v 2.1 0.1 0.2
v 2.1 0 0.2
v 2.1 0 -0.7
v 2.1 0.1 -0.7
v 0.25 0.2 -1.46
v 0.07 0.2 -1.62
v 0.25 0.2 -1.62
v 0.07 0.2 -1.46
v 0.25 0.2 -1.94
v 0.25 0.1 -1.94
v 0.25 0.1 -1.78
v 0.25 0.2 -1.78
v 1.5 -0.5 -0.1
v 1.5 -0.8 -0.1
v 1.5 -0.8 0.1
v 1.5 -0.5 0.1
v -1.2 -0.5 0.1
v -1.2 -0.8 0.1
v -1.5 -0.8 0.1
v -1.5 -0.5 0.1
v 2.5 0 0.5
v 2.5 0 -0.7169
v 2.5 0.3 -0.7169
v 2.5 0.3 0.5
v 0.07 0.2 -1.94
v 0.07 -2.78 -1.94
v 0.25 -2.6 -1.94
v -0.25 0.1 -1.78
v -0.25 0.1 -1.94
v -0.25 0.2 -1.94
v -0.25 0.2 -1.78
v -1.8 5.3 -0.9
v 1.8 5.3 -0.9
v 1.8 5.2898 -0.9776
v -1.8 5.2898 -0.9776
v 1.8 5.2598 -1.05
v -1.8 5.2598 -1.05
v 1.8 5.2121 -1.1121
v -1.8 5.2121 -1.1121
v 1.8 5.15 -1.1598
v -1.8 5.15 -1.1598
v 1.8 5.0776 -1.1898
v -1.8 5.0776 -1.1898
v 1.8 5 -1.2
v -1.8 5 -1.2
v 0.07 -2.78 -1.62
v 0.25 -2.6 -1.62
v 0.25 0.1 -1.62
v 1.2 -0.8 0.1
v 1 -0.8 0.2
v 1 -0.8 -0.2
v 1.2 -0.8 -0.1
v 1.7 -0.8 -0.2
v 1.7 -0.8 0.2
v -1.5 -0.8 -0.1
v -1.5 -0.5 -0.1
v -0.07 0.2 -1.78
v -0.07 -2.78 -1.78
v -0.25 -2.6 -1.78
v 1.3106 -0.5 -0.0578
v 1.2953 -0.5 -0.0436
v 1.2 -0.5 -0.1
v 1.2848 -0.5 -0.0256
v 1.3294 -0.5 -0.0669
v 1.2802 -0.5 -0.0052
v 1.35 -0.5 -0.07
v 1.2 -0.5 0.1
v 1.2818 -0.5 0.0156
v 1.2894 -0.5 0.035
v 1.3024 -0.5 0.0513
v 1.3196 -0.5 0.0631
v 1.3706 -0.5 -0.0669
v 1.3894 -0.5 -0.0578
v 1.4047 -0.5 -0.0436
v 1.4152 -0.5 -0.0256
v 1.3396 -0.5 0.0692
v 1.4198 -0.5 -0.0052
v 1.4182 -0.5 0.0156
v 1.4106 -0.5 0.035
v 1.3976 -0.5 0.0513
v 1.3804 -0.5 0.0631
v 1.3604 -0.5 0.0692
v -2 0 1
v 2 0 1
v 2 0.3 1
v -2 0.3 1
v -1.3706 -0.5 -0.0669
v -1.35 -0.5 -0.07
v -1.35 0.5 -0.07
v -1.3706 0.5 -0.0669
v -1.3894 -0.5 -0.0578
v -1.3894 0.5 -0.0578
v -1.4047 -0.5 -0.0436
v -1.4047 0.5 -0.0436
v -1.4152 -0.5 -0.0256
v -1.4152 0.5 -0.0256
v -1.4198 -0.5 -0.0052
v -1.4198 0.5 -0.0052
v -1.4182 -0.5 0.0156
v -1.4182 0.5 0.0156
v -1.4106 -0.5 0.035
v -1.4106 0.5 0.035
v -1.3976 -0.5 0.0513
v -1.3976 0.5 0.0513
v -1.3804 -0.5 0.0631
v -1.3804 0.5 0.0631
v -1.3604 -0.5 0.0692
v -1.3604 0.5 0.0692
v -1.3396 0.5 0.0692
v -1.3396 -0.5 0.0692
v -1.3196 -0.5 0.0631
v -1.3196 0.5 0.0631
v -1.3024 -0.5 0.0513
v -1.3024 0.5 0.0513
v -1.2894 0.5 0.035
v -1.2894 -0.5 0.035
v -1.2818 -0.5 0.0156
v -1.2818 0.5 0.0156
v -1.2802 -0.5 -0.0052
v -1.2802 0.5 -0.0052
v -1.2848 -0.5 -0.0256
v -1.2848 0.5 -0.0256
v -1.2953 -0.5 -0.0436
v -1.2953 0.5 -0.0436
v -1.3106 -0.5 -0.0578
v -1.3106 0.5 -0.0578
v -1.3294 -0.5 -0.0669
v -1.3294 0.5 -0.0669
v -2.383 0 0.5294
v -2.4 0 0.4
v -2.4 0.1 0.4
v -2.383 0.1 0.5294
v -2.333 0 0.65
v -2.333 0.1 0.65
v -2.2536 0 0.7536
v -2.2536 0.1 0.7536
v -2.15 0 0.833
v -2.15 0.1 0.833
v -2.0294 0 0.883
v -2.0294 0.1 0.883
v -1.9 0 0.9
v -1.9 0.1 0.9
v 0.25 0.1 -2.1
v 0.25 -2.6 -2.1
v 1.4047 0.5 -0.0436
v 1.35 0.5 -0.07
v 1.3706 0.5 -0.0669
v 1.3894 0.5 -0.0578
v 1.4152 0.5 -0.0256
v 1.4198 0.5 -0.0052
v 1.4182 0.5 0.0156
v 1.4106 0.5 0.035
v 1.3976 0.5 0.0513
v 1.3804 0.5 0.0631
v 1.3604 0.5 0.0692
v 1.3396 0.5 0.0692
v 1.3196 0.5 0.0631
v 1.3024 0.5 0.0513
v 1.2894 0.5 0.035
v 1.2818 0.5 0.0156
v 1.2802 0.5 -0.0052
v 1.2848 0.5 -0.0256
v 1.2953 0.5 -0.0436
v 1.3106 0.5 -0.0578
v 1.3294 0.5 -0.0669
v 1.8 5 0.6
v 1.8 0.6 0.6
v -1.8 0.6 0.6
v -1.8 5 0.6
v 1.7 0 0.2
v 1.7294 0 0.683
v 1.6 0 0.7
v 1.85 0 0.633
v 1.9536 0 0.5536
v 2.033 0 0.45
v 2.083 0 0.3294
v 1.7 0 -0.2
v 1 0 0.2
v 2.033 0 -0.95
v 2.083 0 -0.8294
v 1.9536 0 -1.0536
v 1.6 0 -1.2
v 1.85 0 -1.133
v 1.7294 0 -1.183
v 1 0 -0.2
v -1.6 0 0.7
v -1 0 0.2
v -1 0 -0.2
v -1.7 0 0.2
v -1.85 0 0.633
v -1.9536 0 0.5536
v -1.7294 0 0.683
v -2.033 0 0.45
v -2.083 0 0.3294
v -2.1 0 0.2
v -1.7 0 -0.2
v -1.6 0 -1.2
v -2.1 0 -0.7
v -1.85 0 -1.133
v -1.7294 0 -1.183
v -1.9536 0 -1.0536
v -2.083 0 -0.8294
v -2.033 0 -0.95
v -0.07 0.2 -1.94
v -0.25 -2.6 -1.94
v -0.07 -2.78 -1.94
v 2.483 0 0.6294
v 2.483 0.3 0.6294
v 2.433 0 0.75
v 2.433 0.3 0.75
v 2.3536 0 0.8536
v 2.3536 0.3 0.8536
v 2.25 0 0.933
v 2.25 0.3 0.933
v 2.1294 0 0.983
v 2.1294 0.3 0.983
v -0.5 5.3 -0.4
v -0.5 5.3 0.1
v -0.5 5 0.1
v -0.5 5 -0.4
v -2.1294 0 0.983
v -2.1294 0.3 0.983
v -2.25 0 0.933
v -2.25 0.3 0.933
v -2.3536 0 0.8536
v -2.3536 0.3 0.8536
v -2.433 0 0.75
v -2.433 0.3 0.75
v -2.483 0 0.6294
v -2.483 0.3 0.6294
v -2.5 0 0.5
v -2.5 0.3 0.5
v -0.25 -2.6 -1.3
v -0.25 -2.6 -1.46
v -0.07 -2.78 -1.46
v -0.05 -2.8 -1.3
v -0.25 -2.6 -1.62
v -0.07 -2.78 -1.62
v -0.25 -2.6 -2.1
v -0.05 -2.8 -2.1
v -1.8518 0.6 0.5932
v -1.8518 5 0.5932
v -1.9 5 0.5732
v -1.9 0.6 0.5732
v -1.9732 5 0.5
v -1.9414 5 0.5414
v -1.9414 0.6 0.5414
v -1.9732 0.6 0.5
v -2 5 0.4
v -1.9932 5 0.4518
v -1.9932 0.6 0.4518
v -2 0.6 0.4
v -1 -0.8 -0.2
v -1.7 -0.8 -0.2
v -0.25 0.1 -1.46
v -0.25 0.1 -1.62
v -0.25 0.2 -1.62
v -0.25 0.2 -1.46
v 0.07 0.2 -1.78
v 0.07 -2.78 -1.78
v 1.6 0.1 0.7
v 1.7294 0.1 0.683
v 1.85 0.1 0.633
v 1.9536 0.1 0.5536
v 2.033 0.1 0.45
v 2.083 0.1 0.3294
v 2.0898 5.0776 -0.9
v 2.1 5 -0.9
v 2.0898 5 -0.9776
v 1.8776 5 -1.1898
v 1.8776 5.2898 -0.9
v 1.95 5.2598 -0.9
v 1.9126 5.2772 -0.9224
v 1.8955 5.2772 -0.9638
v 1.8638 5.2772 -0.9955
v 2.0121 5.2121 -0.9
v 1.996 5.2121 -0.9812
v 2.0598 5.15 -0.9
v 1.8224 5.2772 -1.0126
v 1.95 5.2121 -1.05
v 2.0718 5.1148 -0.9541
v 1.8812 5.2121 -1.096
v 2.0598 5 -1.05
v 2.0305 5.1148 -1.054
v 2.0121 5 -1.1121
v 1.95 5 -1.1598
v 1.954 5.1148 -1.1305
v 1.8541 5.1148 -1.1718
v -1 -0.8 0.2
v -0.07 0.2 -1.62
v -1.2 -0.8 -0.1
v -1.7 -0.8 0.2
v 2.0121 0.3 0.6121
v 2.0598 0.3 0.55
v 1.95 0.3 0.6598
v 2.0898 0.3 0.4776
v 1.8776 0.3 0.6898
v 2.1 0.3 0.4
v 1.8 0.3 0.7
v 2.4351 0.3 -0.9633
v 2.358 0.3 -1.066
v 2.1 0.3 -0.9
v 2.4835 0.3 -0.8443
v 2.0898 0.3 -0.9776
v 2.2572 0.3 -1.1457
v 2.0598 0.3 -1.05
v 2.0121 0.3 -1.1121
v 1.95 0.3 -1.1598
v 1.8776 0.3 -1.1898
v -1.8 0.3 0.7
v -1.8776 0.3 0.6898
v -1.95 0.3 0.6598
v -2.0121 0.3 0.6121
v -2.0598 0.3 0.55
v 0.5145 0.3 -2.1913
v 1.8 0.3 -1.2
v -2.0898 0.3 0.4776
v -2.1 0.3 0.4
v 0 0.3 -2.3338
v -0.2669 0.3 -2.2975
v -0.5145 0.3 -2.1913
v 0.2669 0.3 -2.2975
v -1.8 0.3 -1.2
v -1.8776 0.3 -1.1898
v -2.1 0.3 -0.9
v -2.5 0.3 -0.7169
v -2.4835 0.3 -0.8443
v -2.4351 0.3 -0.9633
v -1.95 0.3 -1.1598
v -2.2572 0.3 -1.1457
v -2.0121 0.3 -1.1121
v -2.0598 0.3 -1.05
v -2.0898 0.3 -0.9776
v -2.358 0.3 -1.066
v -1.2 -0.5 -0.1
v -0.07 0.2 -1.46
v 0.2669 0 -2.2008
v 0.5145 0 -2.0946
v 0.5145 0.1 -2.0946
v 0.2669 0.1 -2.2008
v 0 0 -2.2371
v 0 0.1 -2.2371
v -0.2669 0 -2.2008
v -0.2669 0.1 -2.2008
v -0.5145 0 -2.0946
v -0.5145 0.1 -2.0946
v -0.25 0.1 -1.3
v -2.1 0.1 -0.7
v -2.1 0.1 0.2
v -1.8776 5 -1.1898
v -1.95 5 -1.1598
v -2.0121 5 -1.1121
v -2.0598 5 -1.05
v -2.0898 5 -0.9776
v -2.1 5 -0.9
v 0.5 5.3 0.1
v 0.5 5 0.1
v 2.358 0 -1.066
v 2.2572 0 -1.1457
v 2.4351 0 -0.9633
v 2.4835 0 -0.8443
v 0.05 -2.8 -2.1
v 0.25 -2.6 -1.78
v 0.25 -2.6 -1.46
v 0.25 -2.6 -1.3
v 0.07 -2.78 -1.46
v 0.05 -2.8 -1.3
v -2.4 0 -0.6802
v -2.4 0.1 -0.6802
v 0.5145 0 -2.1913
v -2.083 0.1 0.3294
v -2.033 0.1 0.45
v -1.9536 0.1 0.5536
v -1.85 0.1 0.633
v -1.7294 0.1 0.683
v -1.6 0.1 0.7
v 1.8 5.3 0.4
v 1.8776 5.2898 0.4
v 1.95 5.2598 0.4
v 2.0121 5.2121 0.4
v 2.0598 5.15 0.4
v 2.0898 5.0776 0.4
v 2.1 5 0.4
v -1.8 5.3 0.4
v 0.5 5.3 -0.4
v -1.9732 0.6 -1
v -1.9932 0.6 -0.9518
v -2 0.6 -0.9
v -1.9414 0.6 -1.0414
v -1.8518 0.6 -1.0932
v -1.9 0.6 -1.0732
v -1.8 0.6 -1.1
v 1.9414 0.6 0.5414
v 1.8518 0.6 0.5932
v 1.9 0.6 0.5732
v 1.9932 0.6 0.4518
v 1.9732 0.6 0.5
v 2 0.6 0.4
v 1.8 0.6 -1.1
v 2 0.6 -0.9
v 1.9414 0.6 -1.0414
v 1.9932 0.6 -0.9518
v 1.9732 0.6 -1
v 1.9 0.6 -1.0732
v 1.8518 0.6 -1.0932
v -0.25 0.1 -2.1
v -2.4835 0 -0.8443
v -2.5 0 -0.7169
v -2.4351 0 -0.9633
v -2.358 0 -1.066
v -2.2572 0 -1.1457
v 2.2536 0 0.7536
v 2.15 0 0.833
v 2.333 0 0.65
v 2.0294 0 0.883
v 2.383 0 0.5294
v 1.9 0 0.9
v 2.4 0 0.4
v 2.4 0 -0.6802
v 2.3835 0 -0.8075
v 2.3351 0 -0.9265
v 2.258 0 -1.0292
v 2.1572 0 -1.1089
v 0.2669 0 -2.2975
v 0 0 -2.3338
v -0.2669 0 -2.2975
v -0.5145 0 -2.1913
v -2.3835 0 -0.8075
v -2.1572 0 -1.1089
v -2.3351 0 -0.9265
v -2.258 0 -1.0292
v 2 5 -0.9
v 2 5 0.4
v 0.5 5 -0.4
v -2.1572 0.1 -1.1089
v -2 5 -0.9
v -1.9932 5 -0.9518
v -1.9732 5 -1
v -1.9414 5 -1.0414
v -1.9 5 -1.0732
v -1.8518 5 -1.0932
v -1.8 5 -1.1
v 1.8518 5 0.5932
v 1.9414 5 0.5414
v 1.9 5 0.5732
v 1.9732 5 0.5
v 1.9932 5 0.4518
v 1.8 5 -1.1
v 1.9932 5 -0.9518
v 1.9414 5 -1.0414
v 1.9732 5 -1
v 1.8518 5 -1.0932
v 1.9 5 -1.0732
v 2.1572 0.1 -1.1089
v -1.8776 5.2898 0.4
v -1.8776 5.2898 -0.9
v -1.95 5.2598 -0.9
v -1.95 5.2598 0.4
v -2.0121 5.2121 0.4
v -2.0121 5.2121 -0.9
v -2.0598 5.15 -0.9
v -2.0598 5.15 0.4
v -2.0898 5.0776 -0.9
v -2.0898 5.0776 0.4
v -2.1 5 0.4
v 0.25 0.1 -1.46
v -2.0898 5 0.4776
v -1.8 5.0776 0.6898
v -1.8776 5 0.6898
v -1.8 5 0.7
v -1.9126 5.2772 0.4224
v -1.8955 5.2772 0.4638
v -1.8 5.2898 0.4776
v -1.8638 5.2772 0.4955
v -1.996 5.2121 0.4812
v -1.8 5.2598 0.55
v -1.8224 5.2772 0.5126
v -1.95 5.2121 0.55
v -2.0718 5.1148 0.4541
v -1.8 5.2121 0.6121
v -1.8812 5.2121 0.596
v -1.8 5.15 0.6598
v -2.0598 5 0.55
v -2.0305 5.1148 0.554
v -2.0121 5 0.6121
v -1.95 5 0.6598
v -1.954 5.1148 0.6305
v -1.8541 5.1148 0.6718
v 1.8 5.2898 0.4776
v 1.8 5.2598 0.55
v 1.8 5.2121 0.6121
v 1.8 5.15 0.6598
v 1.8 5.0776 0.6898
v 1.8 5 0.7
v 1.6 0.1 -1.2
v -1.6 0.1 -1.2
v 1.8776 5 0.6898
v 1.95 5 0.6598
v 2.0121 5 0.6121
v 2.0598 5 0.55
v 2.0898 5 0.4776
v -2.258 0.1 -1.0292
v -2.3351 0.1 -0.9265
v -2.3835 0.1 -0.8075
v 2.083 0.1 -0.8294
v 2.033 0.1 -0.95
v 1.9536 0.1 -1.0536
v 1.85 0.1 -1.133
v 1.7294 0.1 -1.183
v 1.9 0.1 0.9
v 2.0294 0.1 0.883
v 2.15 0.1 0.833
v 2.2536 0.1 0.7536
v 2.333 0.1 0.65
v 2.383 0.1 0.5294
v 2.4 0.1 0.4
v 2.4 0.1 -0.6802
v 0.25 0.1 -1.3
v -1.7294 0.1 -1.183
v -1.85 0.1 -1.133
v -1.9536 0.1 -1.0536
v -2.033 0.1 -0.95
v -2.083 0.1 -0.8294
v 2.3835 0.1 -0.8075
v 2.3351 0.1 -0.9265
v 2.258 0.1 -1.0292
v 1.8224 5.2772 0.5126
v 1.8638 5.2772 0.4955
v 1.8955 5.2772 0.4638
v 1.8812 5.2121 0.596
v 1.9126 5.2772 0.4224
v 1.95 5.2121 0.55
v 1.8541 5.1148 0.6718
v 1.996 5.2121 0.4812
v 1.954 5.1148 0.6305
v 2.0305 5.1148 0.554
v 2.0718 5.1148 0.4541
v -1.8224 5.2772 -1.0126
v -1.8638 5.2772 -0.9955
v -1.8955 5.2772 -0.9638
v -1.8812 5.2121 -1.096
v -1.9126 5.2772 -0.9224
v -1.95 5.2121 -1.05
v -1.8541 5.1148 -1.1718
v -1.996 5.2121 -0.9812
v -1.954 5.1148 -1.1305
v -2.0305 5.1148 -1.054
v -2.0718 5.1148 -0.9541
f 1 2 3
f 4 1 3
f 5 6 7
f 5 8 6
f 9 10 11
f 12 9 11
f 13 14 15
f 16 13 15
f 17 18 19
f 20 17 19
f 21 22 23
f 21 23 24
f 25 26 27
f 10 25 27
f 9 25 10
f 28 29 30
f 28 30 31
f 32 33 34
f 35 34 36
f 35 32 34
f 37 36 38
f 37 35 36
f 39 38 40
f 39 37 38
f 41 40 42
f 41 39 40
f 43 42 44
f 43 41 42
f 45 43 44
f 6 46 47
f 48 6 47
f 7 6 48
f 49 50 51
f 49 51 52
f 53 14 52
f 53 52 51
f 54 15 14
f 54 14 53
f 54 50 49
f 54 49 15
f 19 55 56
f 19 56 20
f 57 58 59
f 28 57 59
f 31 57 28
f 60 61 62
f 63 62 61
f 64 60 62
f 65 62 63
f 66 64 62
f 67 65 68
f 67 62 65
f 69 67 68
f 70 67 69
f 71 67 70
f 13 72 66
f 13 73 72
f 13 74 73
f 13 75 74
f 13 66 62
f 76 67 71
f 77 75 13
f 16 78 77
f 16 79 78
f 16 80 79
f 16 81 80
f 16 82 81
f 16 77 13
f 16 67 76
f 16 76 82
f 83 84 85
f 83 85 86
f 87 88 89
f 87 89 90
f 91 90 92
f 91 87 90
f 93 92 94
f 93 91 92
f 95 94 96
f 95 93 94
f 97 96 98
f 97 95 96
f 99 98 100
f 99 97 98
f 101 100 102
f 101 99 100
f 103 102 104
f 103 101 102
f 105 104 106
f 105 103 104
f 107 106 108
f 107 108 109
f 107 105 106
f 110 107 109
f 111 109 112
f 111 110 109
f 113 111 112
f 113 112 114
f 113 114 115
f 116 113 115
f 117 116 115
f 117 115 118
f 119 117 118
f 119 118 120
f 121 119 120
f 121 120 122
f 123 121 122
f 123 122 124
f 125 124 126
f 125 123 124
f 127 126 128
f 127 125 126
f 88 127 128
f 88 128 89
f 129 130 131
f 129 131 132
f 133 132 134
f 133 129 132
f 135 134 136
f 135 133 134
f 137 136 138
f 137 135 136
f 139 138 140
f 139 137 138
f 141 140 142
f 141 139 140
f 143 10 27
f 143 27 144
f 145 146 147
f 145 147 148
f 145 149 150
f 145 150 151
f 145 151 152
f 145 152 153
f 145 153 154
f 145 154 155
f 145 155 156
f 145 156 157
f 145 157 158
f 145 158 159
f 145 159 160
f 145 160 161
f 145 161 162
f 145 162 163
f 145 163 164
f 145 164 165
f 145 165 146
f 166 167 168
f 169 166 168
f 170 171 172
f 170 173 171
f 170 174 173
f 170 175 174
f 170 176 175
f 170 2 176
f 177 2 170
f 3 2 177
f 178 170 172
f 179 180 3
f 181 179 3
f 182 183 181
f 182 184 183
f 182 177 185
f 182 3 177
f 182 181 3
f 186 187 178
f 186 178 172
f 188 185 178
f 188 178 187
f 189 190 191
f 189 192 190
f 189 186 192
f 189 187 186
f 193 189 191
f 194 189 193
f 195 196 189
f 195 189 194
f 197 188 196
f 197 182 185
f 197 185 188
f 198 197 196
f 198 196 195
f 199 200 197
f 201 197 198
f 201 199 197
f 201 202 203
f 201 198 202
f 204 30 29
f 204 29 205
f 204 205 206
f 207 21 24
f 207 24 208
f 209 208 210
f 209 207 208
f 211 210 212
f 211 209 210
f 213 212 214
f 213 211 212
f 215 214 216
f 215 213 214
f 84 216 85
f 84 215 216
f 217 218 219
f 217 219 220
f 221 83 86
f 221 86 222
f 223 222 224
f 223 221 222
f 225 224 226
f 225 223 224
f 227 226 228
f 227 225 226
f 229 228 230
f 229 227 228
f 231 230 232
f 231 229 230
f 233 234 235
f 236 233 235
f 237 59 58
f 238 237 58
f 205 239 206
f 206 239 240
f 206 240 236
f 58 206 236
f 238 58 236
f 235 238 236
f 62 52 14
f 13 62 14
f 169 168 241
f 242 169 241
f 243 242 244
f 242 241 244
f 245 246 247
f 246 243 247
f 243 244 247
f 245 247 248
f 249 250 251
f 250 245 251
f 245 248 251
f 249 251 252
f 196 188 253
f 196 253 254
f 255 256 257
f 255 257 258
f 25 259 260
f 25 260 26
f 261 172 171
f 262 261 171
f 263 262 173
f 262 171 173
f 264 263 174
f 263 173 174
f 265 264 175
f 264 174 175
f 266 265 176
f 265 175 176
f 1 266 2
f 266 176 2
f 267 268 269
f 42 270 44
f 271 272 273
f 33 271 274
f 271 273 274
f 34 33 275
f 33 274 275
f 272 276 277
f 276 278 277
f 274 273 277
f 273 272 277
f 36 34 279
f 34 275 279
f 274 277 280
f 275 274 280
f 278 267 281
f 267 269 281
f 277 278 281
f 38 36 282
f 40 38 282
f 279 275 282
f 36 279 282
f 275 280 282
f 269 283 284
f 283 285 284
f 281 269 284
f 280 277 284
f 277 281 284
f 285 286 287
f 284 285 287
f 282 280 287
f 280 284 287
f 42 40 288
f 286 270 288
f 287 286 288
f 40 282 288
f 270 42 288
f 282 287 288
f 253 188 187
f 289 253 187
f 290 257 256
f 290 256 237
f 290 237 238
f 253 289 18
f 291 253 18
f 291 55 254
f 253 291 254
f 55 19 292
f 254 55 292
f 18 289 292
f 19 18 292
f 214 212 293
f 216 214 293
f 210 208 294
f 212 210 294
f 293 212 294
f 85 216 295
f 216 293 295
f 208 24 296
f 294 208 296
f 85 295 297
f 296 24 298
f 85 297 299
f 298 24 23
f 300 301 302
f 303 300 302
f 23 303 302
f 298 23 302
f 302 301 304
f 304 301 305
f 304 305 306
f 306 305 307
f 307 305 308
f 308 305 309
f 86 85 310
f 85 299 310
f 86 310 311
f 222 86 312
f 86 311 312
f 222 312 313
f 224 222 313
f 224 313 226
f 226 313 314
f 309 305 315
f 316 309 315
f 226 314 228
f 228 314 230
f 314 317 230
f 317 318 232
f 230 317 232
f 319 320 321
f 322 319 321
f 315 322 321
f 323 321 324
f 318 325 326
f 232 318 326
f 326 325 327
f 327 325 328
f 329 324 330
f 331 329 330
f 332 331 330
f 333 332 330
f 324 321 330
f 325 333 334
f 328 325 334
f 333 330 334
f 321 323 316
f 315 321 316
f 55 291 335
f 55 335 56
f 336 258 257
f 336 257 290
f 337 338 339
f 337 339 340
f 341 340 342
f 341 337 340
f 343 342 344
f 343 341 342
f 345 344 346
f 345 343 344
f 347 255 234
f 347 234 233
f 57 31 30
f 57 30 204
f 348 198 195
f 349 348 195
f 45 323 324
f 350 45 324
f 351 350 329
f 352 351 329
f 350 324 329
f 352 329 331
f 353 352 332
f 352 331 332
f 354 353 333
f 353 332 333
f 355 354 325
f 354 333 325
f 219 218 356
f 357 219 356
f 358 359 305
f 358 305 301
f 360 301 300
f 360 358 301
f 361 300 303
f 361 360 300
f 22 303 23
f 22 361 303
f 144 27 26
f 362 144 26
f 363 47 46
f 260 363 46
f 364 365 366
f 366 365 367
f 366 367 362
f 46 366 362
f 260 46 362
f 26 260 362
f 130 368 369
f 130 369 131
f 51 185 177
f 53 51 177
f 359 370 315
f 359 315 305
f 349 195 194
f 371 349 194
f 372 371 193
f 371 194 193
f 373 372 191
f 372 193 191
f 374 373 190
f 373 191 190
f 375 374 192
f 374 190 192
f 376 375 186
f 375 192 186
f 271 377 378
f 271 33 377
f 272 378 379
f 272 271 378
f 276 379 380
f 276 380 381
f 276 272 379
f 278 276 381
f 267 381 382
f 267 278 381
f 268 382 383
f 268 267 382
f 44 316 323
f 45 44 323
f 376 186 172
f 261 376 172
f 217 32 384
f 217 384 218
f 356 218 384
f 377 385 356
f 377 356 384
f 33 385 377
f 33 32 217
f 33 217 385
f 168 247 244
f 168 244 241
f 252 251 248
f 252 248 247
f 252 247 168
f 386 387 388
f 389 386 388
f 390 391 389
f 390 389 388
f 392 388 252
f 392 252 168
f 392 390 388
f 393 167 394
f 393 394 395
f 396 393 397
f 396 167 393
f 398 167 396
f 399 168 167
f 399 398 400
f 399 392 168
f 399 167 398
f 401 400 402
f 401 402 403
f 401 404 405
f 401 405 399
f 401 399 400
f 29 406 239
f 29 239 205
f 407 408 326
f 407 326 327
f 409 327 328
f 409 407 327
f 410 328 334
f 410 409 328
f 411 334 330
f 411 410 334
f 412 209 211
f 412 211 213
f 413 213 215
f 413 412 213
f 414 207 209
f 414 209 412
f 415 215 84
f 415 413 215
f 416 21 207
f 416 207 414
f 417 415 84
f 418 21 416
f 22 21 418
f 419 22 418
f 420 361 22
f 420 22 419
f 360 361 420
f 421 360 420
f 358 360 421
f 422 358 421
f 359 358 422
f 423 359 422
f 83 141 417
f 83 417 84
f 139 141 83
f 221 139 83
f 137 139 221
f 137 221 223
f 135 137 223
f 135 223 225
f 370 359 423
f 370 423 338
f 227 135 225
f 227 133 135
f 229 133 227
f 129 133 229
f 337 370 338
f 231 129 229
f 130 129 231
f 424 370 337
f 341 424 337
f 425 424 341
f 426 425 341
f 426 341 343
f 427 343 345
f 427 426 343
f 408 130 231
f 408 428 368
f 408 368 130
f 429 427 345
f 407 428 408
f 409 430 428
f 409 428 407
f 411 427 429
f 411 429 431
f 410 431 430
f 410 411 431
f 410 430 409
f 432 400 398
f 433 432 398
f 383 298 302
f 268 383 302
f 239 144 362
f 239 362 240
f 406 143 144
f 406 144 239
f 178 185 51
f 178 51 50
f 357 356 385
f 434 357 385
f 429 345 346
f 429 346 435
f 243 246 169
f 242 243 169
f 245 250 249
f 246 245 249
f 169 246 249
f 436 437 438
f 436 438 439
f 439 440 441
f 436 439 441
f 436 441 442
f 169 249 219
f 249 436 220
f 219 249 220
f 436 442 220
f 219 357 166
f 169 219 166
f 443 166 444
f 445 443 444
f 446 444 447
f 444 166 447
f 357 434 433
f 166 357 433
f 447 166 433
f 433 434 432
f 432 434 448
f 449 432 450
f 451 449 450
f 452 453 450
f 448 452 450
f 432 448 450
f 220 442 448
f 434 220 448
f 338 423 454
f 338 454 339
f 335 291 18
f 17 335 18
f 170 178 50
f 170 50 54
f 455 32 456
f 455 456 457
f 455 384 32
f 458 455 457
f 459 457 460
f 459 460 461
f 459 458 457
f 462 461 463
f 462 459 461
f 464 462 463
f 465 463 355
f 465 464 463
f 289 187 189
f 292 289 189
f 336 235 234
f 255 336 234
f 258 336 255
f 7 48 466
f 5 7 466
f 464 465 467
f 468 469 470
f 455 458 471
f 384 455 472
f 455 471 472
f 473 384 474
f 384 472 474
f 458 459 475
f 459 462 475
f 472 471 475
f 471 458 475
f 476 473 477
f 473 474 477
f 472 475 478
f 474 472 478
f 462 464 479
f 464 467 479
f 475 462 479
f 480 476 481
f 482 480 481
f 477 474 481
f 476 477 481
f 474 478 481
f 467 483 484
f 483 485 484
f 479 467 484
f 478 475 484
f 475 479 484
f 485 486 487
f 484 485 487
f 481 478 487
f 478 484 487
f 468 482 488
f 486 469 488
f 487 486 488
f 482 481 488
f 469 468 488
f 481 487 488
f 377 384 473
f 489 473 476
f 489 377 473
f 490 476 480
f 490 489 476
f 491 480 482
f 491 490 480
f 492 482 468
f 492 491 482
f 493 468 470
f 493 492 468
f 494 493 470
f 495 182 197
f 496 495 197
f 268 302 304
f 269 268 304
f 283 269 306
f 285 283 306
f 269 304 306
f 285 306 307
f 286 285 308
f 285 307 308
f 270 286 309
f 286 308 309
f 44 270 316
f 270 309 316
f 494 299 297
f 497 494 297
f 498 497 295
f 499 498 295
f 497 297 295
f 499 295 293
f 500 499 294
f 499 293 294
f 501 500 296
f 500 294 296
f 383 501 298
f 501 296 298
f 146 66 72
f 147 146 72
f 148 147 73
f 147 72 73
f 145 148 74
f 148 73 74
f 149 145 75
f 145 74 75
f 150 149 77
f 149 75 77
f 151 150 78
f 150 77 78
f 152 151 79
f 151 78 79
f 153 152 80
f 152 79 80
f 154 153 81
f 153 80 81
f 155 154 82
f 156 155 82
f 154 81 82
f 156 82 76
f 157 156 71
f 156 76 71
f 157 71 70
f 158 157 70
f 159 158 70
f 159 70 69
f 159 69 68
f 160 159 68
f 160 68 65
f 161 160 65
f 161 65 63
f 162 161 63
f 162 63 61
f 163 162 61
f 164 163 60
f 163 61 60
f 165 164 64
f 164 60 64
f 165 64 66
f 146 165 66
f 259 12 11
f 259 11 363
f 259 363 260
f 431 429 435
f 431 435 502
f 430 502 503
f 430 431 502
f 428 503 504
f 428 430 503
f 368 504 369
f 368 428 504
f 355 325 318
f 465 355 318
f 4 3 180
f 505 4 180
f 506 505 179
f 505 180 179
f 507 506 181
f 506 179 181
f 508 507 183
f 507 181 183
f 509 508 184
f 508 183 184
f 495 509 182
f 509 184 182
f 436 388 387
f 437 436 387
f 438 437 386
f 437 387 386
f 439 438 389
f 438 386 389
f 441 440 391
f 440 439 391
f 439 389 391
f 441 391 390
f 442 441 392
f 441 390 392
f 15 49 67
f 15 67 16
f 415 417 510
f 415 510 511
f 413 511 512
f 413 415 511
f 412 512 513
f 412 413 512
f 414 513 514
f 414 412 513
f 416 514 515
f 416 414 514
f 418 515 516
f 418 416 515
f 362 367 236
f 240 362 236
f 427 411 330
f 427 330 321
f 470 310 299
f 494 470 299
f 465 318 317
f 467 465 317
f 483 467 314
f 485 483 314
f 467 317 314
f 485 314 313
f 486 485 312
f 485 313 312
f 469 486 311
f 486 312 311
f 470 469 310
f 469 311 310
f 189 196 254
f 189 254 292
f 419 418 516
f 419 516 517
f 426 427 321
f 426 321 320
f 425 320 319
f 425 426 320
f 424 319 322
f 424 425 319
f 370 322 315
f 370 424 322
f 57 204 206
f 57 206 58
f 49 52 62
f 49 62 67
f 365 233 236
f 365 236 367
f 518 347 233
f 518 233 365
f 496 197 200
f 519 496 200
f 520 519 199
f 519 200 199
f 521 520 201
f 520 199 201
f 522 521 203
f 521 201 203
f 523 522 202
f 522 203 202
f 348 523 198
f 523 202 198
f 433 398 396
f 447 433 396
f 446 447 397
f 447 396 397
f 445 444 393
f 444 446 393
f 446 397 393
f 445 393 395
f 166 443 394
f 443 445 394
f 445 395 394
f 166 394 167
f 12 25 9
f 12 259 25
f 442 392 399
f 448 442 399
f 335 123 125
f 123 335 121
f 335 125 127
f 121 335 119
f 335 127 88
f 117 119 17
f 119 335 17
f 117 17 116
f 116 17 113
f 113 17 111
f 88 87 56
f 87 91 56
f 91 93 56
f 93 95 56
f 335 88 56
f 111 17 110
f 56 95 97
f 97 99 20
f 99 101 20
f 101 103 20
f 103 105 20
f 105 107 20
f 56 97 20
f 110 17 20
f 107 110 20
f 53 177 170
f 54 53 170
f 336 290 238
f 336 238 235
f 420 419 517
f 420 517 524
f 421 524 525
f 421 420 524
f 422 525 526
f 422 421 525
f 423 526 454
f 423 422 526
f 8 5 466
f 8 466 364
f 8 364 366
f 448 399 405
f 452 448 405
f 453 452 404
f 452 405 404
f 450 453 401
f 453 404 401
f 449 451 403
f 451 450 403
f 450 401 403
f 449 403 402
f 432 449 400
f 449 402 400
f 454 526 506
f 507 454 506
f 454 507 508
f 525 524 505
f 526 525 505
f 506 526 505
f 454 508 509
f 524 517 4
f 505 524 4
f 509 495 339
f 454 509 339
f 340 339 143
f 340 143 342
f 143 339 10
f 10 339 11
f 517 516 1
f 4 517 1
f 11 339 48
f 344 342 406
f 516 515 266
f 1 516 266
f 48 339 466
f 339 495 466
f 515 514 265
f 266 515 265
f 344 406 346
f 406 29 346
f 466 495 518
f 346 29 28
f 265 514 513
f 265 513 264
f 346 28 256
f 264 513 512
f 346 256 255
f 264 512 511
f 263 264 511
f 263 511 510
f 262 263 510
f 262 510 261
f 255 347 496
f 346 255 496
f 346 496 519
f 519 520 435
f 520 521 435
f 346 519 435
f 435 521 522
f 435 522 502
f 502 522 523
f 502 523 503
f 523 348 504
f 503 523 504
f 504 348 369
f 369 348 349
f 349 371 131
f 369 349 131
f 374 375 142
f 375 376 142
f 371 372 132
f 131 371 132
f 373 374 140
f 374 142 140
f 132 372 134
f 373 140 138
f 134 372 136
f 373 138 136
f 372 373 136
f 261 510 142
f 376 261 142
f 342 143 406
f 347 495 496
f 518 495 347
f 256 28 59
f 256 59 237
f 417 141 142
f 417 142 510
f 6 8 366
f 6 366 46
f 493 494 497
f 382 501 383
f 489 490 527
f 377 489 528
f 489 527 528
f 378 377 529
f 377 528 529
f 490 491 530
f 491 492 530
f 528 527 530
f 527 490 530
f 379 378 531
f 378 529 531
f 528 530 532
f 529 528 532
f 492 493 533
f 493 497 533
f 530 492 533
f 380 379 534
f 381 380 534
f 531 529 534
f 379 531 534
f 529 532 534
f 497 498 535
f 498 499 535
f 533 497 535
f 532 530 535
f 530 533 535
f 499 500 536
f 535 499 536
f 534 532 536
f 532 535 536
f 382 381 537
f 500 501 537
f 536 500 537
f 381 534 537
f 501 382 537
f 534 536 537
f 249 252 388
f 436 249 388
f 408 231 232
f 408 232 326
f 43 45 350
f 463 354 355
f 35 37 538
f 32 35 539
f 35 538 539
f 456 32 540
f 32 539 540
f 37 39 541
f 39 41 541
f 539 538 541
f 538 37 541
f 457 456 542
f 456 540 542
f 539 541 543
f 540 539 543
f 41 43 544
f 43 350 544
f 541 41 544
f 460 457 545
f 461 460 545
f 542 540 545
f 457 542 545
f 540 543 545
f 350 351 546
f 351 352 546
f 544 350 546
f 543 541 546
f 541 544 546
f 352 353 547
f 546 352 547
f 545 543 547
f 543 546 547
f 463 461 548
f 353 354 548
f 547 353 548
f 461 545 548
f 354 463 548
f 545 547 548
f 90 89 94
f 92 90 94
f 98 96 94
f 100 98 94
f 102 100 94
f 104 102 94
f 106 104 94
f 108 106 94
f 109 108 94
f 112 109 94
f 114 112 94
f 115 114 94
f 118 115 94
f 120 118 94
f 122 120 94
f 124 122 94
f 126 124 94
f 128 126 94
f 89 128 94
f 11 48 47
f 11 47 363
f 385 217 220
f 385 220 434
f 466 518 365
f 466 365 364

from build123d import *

# Parameters (mm, degrees)
BOSS_EXTRUDE1_DEPTH   = 0.3
EXTRUDE_THIN1_DEPTH   = 5
EXTRUDE_THIN1_2_DEPTH = 0.3
EXTRUDE_THIN1_START   = 4.7
EXTRUDE_THIN1_3_DEPTH = 0.3
FILLET2_R             = 0.3
CUT_EXTRUDE2_REACH    = 8.308
SKETCH5_W             = 1
SKETCH5_H             = 0.5
SKETCH6_W             = 0.7
SKETCH6_H             = 0.4
SKETCH6_W_2           = 0.5
SKETCH6_H_2           = 0.8
CUT_EXTRUDE3_DEPTH    = 0.2
CUT_EXTRUDE4_DEPTH    = 0.1
BOSS_EXTRUDE2_DEPTH   = 3
CHAMFER1_SIZE         = 0.2
SKETCH9_W             = 0.7
SKETCH9_H             = 0.4
BOSS_EXTRUDE3_DEPTH   = 1
SKETCH10_W            = 0.3
SKETCH10_H            = 0.2
CUT_EXTRUDE5_DEPTH    = 0.3
SKETCH11_R            = 0.07
CUT_EXTRUDE6_DEPTH    = 1


# Read off the part's stored shape, not the designer's step: Extrude-Thin1
with BuildPart() as part:
    # Sketch2 → Boss-Extrude1 (new body)
    with BuildSketch(Plane(origin=(0, 0, 0), x_dir=(1, 0, 0), z_dir=(0, 1, 0))):
        with BuildLine():
            Line((-2.257247878, 1.145651273), (-0.514495755, 2.191302547))
            ThreePointArc((-0.514495755, 2.191302547), (0, 2.333809621), (0.514495755, 2.191302547))
            Line((0.514495755, 2.191302547), (2.257247878, 1.145651273))
            ThreePointArc((2.257247878, 1.145651273), (2.435099953, 0.963254218), (2.5, 0.716904811))
            Line((2.5, 0.716904811), (2.5, -0.5))
            ThreePointArc((2.5, -0.5), (2.353553391, -0.853553391), (2, -1))
            Line((2, -1), (-2, -1))
            ThreePointArc((-2, -1), (-2.353553391, -0.853553391), (-2.5, -0.5))
            Line((-2.5, -0.5), (-2.5, 0.716904811))
            ThreePointArc((-2.5, 0.716904811), (-2.435099953, 0.963254218), (-2.257247878, 1.145651273))
        make_face()
    extrude(amount=BOSS_EXTRUDE1_DEPTH)

    # Extrude-Thin1 outline → Extrude-Thin1 (add)
    with BuildSketch(Plane(origin=(0, 0.3, 0), x_dir=(1, 0, 0), z_dir=(0, 1, 0))):
        with BuildLine():
            ThreePointArc((-1.8, 1.2), (-2.012132034, 1.112132034), (-2.1, 0.9))
            Line((-2.1, 0.9), (-2.1, -0.4))
            ThreePointArc((-2.1, -0.4), (-2.012132034, -0.612132034), (-1.8, -0.7))
            Line((-1.8, -0.7), (1.8, -0.7))
            ThreePointArc((1.8, -0.7), (2.012132034, -0.612132034), (2.1, -0.4))
            Line((2.1, -0.4), (2.1, 0.9))
            ThreePointArc((2.1, 0.9), (2.012132034, 1.112132034), (1.8, 1.2))
            Line((1.8, 1.2), (-1.8, 1.2))
        make_face()
        with BuildLine():
            Line((-2, -0.4), (-2, 0.9))
            ThreePointArc((-2, 0.9), (-1.941421356, 1.041421356), (-1.8, 1.1))
            Line((-1.8, 1.1), (1.8, 1.1))
            ThreePointArc((1.8, 1.1), (1.941421356, 1.041421356), (2, 0.9))
            Line((2, 0.9), (2, -0.4))
            ThreePointArc((2, -0.4), (1.941421356, -0.541421356), (1.8, -0.6))
            Line((1.8, -0.6), (-1.8, -0.6))
            ThreePointArc((-1.8, -0.6), (-1.941421356, -0.541421356), (-2, -0.4))
        make_face(mode=Mode.SUBTRACT)
    extrude(amount=EXTRUDE_THIN1_DEPTH)

    # Extrude-Thin1 2 outline → Extrude-Thin1 2 (add)
    with BuildSketch(Plane(origin=(0, 0.3, 0), x_dir=(1, 0, 0), z_dir=(0, 1, 0))):
        with BuildLine():
            ThreePointArc((-1.8, 1.1), (-1.941421356, 1.041421356), (-2, 0.9))
            Line((-2, 0.9), (-2, -0.4))
            ThreePointArc((-2, -0.4), (-1.941421356, -0.541421356), (-1.8, -0.6))
            Line((-1.8, -0.6), (1.8, -0.6))
            ThreePointArc((1.8, -0.6), (1.941421356, -0.541421356), (2, -0.4))
            Line((2, -0.4), (2, 0.9))
            ThreePointArc((2, 0.9), (1.941421356, 1.041421356), (1.8, 1.1))
            Line((1.8, 1.1), (-1.8, 1.1))
        make_face()
    extrude(amount=EXTRUDE_THIN1_2_DEPTH)

    # Extrude-Thin1 3 outline → Extrude-Thin1 3 (add)
    with BuildSketch(Plane(origin=(0, 0.3, 0), x_dir=(1, 0, 0), z_dir=(0, 1, 0)).offset(EXTRUDE_THIN1_START)):
        with BuildLine():
            ThreePointArc((-1.8, 1.1), (-1.941421356, 1.041421356), (-2, 0.9))
            Line((-2, 0.9), (-2, -0.4))
            ThreePointArc((-2, -0.4), (-1.941421356, -0.541421356), (-1.8, -0.6))
            Line((-1.8, -0.6), (1.8, -0.6))
            ThreePointArc((1.8, -0.6), (1.941421356, -0.541421356), (2, -0.4))
            Line((2, -0.4), (2, 0.9))
            ThreePointArc((2, 0.9), (1.941421356, 1.041421356), (1.8, 1.1))
            Line((1.8, 1.1), (-1.8, 1.1))
        make_face()
    extrude(amount=EXTRUDE_THIN1_3_DEPTH)

    # Fillet2
    fillet2_edges = [part.edges().sort_by_distance(p)[0] for p in [
        (2.1, 5.3, -0.25),
        (2.012132034, 5.3, -1.112132034),
        (0, 5.3, -1.2),
        (-2.012132034, 5.3, -1.112132034),
        (-2.1, 5.3, -0.25),
        (-2.012132034, 5.3, 0.612132034),
        (0, 5.3, 0.7),
        (2.012132034, 5.3, 0.612132034),
    ]]
    fillet(fillet2_edges, radius=FILLET2_R)

    # Sketch5 → Cut-Extrude2 (cut, up to next)
    with BuildSketch(Plane(origin=(0, 5.3, 0), x_dir=(1, 0, 0), z_dir=(0, 1, 0)), mode=Mode.PRIVATE) as cut_extrude2_sk1:
        with Locations((0, 0.15)):
            Rectangle(SKETCH5_W, SKETCH5_H)
    cut_extrude2_tool1 = extrude(cut_extrude2_sk1.sketch, amount=-CUT_EXTRUDE2_REACH, mode=Mode.PRIVATE) & part.part
    add(cut_extrude2_tool1.solids().sort_by_distance((0, 5.3, -0.15))[0], mode=Mode.SUBTRACT)

    # Sketch6 → Cut-Extrude3 (cut)
    with BuildSketch(Plane.XZ):
        with Locations((-1.35, 0)):
            Rectangle(SKETCH6_W, SKETCH6_H)
        with Locations((1.35, 0)):
            Rectangle(SKETCH6_W, SKETCH6_H)
        with Locations((0, -1.7)):
            Rectangle(SKETCH6_W_2, SKETCH6_H_2)
    extrude(amount=-CUT_EXTRUDE3_DEPTH, mode=Mode.SUBTRACT)

    # Sketch7 → Cut-Extrude4 (cut)
    with BuildSketch(Plane.XZ):
        with BuildLine():
            Line((-1.9, 0.9), (1.9, 0.9))
            ThreePointArc((1.9, 0.9), (2.253553391, 0.753553391), (2.4, 0.4))
            Line((2.4, 0.4), (2.4, -0.680159029))
            ThreePointArc((2.4, -0.680159029), (2.335099953, -0.926508436), (2.157247878, -1.108905491))
            Line((2.157247878, -1.108905491), (0.514495755, -2.094556765))
            ThreePointArc((0.514495755, -2.094556765), (0, -2.237063839), (-0.514495755, -2.094556765))
            Line((-0.514495755, -2.094556765), (-2.157247878, -1.108905491))
            ThreePointArc((-2.157247878, -1.108905491), (-2.335099953, -0.926508436), (-2.4, -0.680159029))
            Line((-2.4, -0.680159029), (-2.4, 0.4))
            ThreePointArc((-2.4, 0.4), (-2.253553391, 0.753553391), (-1.9, 0.9))
        make_face()
        with BuildLine():
            Line((-1.6, 0.7), (1.6, 0.7))
            ThreePointArc((1.6, 0.7), (1.953553391, 0.553553391), (2.1, 0.2))
            Line((2.1, 0.2), (2.1, -0.7))
            ThreePointArc((2.1, -0.7), (1.953553391, -1.053553391), (1.6, -1.2))
            Line((1.6, -1.2), (-1.6, -1.2))
            ThreePointArc((-1.6, -1.2), (-1.953553391, -1.053553391), (-2.1, -0.7))
            Line((-2.1, -0.7), (-2.1, 0.2))
            ThreePointArc((-2.1, 0.2), (-1.953553391, 0.553553391), (-1.6, 0.7))
        make_face(mode=Mode.SUBTRACT)
    extrude(amount=-CUT_EXTRUDE4_DEPTH, mode=Mode.SUBTRACT)

    # Sketch8 → Boss-Extrude2 (add)
    with BuildSketch(Plane.XZ.offset(-0.2)):
        Polygon((0.25, -1.46), (0.07, -1.46), (0.07, -1.62), (0.25, -1.62), (0.25, -1.78), (0.07, -1.78), (0.07, -1.94), (0.25, -1.94), (0.25, -2.1), (-0.25, -2.1), (-0.25, -1.94), (-0.07, -1.94), (-0.07, -1.78), (-0.25, -1.78), (-0.25, -1.62), (-0.07, -1.62), (-0.07, -1.46), (-0.25, -1.46), (-0.25, -1.3), (0.25, -1.3), align=None)
    extrude(amount=BOSS_EXTRUDE2_DEPTH)

    # Chamfer1
    # the kernel refuses this chamfer: 0.2 mm, written as the material it takes off along each edge
    with BuildSketch(Plane(origin=(-0.25, -2.8, -1.974336598), x_dir=(-0.027495876610586223, 0.9996219169112966, 0), z_dir=(0, 0, 1)), Plane(origin=(-0.25, -2.8, -2.294336598), x_dir=(-0.027495876610586223, 0.9996219169112966, 0), z_dir=(0, 0, 1)), Plane(origin=(-0.25, -2.8, -2.614336598), x_dir=(-0.027495876610586355, 0.9996219169112966, 0), z_dir=(0, 0, 1)), Plane(origin=(0.25, -2.8, -1.425663402), x_dir=(0.027495876610586223, 0.9996219169112966, 0), z_dir=(0, 0, -1)), Plane(origin=(0.25, -2.8, -1.105663402), x_dir=(0.027495876610586223, 0.9996219169112966, 0), z_dir=(0, 0, -1)), Plane(origin=(0.25, -2.8, -0.785663402), x_dir=(0.027495876610586223, 0.9996219169112966, 0), z_dir=(0, 0, -1))) as chamfer1_piece_1:
        Polygon((CHAMFER1_SIZE * 0.999621916911, -CHAMFER1_SIZE * 0.0274958766106), (-CHAMFER1_SIZE * 0.0274958766106, -CHAMFER1_SIZE * 0.999621916911), (0, 0), align=None)
    extrude(amount=1.188673195, mode=Mode.SUBTRACT)

    # Sketch9 → Boss-Extrude3 (add)
    with BuildSketch(Plane.XZ.offset(-0.2)):
        with Locations((1.35, 0)):
            Rectangle(SKETCH9_W, SKETCH9_H)
    boss_extrude3 = extrude(amount=BOSS_EXTRUDE3_DEPTH)

    # Sketch10 → Cut-Extrude5 (cut)
    with BuildSketch(Plane.XZ.offset(0.8)):
        with Locations((1.35, 0)):
            Rectangle(SKETCH10_W, SKETCH10_H)
        with Locations((-1.35, 0)):
            Rectangle(SKETCH10_W, SKETCH10_H)
    cut_extrude5 = extrude(amount=-CUT_EXTRUDE5_DEPTH, mode=Mode.SUBTRACT)

    # Sketch11 → Cut-Extrude6 (cut)
    with BuildSketch(Plane.XZ.offset(0.5)):
        with Locations(Location((1.35, 0, 0), (0, 0, 270))):
            Circle(SKETCH11_R)
    cut_extrude6 = extrude(amount=-CUT_EXTRUDE6_DEPTH, mode=Mode.SUBTRACT)

    # Mirror2: Boss-Extrude3, Cut-Extrude5, Cut-Extrude6 across plane
    add(boss_extrude3.mirror(Plane(origin=(0, 0, 0), x_dir=(0, 0, 1), z_dir=(1, 0, 0))))
    add(cut_extrude5.mirror(Plane(origin=(0, 0, 0), x_dir=(0, 0, 1), z_dir=(1, 0, 0))), mode=Mode.SUBTRACT)
    add(cut_extrude6.mirror(Plane(origin=(0, 0, 0), x_dir=(0, 0, 1), z_dir=(1, 0, 0))), mode=Mode.SUBTRACT)


solid = part.part
